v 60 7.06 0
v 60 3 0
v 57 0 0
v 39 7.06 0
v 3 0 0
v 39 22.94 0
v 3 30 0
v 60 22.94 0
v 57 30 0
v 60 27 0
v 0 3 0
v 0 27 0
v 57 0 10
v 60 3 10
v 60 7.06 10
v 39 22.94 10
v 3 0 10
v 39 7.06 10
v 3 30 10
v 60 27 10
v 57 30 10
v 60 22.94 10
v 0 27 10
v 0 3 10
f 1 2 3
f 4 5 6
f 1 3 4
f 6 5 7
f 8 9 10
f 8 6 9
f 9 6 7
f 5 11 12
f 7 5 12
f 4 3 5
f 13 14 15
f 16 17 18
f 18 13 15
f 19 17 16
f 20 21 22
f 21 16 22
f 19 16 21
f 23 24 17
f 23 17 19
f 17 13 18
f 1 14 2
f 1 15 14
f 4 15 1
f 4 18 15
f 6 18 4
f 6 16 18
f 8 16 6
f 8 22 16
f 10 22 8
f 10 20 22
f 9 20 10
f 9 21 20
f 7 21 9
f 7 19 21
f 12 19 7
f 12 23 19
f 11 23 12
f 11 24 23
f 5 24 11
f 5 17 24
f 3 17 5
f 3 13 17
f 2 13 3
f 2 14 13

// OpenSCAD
$fn = 32;

// ----------------------------------------------------------------------
// C washer: 60 x 30 mm plate with an open slot
// ----------------------------------------------------------------------

// --- parameters (mm) ---
profile_height = 10;      // extrusion height
profile_points = 12;      // points of the closed outline

profile = [[3, 0], [57, 0], [60, 3], [60, 7.06], [39, 7.06], [39, 22.94], [60, 22.94], [60, 27], [57, 30], [3, 30], [0, 27], [0, 3]];  // single closed polygon, 12 points, counter clockwise

// --- the one profile operation ---
linear_extrude(height = profile_height) polygon(points = profile);
